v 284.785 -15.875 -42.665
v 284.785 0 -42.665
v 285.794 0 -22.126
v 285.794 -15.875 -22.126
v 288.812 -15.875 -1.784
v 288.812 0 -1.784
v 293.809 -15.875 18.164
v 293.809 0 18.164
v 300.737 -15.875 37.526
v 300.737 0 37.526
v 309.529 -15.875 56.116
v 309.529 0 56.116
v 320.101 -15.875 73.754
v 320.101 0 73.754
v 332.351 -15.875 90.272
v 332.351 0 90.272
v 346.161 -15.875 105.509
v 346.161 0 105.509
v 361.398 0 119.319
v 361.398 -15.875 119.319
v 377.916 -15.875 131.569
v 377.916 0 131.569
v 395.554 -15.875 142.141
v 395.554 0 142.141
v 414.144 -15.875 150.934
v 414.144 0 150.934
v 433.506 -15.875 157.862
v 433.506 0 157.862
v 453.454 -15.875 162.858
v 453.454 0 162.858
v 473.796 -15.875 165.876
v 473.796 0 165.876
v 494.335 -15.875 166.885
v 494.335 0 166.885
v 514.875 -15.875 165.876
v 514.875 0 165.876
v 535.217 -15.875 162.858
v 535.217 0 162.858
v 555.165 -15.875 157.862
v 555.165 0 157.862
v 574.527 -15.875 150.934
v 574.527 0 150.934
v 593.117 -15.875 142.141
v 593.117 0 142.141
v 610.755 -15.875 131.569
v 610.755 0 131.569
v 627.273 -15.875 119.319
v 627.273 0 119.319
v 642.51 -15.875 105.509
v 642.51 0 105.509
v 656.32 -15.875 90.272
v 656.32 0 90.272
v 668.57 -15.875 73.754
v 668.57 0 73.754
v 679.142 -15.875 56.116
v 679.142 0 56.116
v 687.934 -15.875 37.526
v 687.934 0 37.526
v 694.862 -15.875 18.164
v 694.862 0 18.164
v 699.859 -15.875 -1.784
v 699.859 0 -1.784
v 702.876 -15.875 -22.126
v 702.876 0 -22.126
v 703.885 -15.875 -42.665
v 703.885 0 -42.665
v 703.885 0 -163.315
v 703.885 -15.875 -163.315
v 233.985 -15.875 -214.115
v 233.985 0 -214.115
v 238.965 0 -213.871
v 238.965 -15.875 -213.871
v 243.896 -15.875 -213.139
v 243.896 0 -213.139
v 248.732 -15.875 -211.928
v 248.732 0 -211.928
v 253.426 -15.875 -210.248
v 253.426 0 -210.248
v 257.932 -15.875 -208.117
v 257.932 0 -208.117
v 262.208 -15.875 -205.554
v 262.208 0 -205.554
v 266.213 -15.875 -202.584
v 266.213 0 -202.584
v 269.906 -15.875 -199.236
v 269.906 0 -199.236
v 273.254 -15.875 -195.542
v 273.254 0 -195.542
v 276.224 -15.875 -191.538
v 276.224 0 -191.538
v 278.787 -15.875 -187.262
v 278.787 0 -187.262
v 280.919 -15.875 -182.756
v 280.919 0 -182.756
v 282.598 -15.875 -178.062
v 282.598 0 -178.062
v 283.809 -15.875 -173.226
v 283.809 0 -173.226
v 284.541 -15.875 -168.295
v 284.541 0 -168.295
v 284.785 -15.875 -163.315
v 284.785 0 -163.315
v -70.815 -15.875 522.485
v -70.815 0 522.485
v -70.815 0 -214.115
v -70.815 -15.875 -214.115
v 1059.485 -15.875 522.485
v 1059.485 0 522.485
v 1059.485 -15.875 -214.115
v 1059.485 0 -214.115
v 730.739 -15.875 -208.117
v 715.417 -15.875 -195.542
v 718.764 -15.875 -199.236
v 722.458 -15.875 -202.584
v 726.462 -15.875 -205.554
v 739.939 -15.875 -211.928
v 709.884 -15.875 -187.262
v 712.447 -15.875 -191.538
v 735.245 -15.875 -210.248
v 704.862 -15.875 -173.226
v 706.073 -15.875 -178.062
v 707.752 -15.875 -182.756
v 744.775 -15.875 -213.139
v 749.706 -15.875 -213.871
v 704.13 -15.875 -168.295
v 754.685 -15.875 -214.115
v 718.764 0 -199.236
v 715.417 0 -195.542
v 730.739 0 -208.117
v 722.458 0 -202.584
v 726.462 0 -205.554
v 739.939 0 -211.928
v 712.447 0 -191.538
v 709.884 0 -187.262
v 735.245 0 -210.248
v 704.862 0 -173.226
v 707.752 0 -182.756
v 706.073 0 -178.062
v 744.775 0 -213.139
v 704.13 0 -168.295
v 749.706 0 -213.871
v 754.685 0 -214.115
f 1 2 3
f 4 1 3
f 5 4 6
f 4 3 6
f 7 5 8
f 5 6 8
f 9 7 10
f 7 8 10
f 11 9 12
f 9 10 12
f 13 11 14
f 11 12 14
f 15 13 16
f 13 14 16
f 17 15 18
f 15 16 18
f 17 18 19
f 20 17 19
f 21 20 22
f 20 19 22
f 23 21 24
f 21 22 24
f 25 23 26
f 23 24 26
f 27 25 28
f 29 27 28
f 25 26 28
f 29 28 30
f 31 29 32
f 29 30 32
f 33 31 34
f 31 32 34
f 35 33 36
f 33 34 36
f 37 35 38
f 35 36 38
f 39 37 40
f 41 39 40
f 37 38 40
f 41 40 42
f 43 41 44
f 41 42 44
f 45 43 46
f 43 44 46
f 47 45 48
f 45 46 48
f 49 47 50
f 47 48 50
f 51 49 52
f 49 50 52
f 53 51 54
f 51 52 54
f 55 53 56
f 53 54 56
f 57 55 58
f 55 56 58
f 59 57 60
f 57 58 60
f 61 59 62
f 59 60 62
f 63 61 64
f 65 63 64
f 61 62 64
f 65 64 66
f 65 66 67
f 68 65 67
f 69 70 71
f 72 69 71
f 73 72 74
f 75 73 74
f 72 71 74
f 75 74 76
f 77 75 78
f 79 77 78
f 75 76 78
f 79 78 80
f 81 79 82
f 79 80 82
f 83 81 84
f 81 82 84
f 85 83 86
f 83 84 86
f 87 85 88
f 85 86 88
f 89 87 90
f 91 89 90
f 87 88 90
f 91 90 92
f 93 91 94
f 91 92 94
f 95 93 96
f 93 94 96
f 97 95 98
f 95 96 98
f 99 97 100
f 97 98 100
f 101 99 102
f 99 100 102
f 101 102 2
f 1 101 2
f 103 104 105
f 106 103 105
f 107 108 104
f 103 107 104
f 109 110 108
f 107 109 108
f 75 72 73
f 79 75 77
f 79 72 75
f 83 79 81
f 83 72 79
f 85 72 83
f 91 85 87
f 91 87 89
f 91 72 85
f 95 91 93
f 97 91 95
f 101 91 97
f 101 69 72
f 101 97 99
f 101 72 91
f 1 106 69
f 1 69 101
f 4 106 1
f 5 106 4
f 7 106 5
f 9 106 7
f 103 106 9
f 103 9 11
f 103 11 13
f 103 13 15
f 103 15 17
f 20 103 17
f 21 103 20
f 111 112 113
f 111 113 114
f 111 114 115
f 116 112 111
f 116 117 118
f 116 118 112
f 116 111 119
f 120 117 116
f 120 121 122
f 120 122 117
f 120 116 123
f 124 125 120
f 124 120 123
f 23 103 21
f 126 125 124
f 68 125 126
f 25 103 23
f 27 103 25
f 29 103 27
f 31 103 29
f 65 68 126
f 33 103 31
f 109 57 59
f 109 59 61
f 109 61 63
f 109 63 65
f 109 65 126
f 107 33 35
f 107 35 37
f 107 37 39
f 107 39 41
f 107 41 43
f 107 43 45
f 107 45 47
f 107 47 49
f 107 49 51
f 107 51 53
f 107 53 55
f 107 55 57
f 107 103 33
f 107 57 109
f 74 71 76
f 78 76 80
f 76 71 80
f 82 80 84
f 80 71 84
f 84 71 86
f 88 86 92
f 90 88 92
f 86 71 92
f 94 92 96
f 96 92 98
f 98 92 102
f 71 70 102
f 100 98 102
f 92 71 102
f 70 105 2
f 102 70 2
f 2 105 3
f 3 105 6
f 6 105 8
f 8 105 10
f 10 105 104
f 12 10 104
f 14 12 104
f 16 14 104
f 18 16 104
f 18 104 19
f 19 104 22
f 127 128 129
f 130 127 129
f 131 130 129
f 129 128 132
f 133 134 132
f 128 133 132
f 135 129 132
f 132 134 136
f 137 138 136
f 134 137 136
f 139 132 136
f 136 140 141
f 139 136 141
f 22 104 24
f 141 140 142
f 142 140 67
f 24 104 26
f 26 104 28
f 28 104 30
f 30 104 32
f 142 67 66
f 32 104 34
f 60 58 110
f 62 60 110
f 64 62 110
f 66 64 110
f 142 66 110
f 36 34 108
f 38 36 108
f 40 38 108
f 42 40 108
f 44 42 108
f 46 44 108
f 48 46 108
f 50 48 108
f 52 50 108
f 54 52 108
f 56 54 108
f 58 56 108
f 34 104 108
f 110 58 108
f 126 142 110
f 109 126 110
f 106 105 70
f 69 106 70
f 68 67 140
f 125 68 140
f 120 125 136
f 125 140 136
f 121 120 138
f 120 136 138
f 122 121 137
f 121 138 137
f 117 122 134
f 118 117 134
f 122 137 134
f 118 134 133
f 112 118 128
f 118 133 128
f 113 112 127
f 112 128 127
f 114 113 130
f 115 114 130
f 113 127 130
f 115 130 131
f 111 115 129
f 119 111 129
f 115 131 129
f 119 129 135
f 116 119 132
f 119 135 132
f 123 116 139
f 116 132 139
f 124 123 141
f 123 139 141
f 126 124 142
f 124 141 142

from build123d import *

# Parameters (mm, degrees)
F1_DEPTH = 15.875


with BuildPart() as f1:
    # F0 (on Front) → F1 (new body)
    with BuildSketch(Plane.XZ):
        with BuildLine():
            Line((1059.485458, 522.484738), (-70.814542, 522.484738))
            Line((-70.814542, 522.484738), (-70.814542, -214.115262))
            Line((-70.814542, -214.115262), (233.985458, -214.115262))
            ThreePointArc((233.985458, -214.115262), (269.906482, -199.236287), (284.785458, -163.315262))
            Line((284.785458, -163.315262), (284.785458, -42.665262))
            ThreePointArc((284.785458, -42.665262), (494.335458, 166.884738), (703.885458, -42.665262))
            Line((703.885458, -42.665262), (703.885458, -163.315262))
            ThreePointArc((703.885458, -163.315262), (718.764433, -199.236287), (754.685458, -214.115262))
            Line((754.685458, -214.115262), (1059.485458, -214.115262))
            Line((1059.485458, -214.115262), (1059.485458, 522.484738))
        make_face()
    extrude(amount=F1_DEPTH)


solid = f1.part
